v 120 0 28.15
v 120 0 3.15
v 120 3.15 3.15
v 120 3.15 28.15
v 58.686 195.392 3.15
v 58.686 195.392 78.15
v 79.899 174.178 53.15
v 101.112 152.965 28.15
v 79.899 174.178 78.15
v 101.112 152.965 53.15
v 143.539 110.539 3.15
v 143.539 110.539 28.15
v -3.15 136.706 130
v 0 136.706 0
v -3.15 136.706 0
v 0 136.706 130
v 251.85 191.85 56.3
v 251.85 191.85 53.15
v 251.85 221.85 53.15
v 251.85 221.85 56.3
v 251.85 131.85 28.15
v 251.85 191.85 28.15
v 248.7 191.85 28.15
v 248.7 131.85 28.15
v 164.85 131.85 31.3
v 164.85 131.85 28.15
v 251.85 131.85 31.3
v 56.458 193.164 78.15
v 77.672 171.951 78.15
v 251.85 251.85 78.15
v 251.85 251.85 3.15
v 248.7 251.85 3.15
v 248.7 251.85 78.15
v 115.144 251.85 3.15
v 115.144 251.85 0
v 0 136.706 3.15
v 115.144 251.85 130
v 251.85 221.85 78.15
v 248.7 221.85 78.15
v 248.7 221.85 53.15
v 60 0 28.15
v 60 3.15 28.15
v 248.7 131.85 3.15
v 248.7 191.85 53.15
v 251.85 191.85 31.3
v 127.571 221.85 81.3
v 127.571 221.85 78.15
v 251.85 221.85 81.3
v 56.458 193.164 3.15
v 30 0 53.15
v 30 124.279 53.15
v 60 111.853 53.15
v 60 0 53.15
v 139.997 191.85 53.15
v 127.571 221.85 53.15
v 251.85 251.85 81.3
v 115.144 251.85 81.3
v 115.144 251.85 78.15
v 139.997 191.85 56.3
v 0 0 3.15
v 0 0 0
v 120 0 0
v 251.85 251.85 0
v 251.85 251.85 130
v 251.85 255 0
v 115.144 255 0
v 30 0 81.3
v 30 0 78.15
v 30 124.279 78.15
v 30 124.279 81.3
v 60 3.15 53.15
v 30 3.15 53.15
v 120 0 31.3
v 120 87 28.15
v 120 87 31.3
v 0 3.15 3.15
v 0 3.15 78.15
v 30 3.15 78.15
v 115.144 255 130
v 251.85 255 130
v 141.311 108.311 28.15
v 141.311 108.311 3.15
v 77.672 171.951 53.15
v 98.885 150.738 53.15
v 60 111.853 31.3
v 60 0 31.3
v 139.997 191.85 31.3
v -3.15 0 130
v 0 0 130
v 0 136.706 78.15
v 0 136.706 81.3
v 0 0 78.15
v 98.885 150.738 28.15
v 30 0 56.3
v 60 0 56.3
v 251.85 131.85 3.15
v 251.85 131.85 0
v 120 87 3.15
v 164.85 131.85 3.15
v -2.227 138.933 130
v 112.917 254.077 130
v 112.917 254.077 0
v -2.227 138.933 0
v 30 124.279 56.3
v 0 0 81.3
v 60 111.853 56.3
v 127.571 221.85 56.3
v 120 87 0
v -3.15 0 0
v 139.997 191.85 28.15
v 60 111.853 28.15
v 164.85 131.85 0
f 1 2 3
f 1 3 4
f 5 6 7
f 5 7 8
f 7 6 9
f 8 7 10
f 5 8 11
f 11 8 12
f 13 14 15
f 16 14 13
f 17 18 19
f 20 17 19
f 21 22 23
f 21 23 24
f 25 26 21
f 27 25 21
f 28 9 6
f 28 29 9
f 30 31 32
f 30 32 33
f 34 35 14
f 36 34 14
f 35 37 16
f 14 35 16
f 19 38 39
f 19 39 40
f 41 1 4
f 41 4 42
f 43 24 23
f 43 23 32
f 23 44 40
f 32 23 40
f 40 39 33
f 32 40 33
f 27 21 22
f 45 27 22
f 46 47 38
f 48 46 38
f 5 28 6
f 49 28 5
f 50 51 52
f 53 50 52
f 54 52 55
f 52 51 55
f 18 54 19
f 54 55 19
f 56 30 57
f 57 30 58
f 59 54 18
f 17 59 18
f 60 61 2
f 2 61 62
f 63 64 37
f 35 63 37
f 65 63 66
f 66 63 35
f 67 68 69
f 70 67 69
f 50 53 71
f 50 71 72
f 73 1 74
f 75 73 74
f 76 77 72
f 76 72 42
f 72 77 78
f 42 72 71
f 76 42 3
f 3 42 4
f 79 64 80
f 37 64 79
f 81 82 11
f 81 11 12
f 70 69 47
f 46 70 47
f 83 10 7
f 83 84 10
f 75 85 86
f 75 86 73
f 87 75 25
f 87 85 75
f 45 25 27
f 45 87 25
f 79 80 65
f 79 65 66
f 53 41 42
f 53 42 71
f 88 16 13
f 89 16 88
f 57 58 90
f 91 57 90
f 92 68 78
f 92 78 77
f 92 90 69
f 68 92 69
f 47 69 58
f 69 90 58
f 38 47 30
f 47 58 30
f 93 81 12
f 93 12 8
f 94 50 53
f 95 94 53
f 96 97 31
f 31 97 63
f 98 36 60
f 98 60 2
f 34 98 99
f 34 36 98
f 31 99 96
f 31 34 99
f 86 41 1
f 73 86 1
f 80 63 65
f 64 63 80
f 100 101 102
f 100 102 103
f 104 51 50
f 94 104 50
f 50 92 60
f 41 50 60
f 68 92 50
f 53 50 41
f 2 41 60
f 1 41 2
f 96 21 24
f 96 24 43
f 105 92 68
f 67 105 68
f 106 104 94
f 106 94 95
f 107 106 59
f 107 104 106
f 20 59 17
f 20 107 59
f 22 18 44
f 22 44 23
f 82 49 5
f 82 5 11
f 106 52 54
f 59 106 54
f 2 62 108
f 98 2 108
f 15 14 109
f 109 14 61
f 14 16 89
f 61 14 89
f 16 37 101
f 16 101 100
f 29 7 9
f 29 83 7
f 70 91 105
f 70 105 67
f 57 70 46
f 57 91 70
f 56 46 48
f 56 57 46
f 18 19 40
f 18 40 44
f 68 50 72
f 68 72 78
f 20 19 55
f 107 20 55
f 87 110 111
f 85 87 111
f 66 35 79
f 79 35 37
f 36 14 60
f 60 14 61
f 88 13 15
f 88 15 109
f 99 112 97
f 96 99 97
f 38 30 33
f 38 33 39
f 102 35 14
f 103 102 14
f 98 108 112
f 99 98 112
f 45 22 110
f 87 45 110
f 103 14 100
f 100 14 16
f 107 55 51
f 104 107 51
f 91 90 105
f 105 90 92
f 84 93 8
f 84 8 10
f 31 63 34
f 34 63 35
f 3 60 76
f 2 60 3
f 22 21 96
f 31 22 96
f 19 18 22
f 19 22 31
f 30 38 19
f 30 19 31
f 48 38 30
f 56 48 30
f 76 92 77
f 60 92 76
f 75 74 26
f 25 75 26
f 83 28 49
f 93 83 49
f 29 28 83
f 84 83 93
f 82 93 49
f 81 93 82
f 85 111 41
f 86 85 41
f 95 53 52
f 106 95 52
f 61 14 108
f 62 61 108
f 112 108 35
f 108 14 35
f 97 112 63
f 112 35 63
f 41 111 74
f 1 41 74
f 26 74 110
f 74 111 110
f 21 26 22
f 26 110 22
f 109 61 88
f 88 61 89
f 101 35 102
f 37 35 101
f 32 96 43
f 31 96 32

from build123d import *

# Parameters (mm, degrees)
F2_DEPTH       = 3.15
F4_DEPTH       = 3.15
F6_DEPTH       = 3.15
F7_W           = 136.7056274848
F7_H           = 130
F8_DEPTH       = 3.15
F9_W           = 136.7056274848
F9_H           = 130
F10_DEPTH      = 3.15
F11_W          = 162.838733242
F11_H          = 130
F12_DEPTH      = 3.15
F16_DEPTH      = 1.575
F16_DEPTH_BACK = 1.575
F18_DEPTH      = 3.15
F20_DEPTH      = 3.15
F22_DEPTH      = 3.15


with BuildPart() as f2:
    # F1 (on Top) → F2 (new body)
    with BuildSketch(Plane.XY):
        Polygon((0, 136.7056274848), (0, 0), (120, 0), (120, 87), (164.85, 131.85), (251.85, 131.85), (251.85, 251.85), (115.1443725152, 251.85), align=None)
    extrude(amount=F2_DEPTH)


with BuildPart() as f4:
    # F3 (on face) → F4 (new body)
    with BuildSketch(Plane.XZ):
        Polygon((0, 78.15), (0, 3.15), (120, 3.15), (120, 28.15), (60, 28.15), (60, 53.15), (30, 53.15), (30, 78.15), align=None)
    extrude(amount=-F4_DEPTH)


with BuildPart() as f6:
    # F5 (on face) → F6 (new body)
    with BuildSketch(Plane.YZ.offset(251.85)):
        Polygon((251.85, 78.15), (221.85, 78.15), (221.85, 53.15), (191.85, 53.15), (191.85, 28.15), (131.85, 28.15), (131.85, 3.15), (251.85, 3.15), align=None)
    extrude(amount=-F6_DEPTH)


with BuildPart() as f8:
    # F7 (on face) → F8 (new body)
    with BuildSketch(Plane(origin=(0, 0, 0), x_dir=(0, -1, 0), z_dir=(-1, 0, 0))):
        with Locations((-68.3528137424, 65)):
            Rectangle(F7_W, F7_H)
    extrude(amount=F8_DEPTH)


with BuildPart() as f10:
    # F9 (on face) → F10 (new body)
    with BuildSketch(Plane(origin=(0, 251.85, 0), x_dir=(-1, 0, 0), z_dir=(0, 1, 0))):
        with Locations((-183.4971862576, 65)):
            Rectangle(F9_W, F9_H)
    extrude(amount=F10_DEPTH)


with BuildPart() as f12:
    # F11 (on face) → F12 (new body)
    with BuildSketch(Plane(origin=(-68.3528137424, 68.3528137424, 0), x_dir=(-0.7071067812, -0.7071067812, 0), z_dir=(-0.7071067812, 0.7071067812, 0))):
        with Locations((-178.0848428418, 65)):
            Rectangle(F11_W, F11_H)
    extrude(amount=F12_DEPTH)


with BuildPart() as f16:
    # F15 (on plane+point) → F16 (new body, two sides)
    with BuildSketch(Plane(origin=(125.925, 125.925, 0), x_dir=(0.7071067812, -0.7071067812, 0), z_dir=(-0.7071067812, -0.7071067812, 0))) as f16_sk:
        Polygon((-66.6654762208, 78.15), (-96.6654762208, 78.15), (-96.6654762208, 3.15), (23.3345237792, 3.15), (23.3345237792, 28.15), (-36.6654762208, 28.15), (-36.6654762208, 53.15), (-66.6654762208, 53.15), align=None)
    extrude(amount=F16_DEPTH)
    extrude(f16_sk.sketch, amount=-F16_DEPTH_BACK)


with BuildPart() as f18:
    # F17 (on face) → F18 (new body)
    with BuildSketch(Plane.XY.offset(28.15)):
        Polygon((251.85, 191.85), (139.9971862576, 191.85), (60, 111.8528137424), (60, 0), (120, 0), (120, 87), (164.85, 131.85), (251.85, 131.85), align=None)
    extrude(amount=F18_DEPTH)


with BuildPart() as f20:
    # F19 (on face) → F20 (new body)
    with BuildSketch(Plane.XY.offset(53.15)):
        Polygon((251.85, 221.85), (127.5707793864, 221.85), (30, 124.2792206136), (30, 0), (60, 0), (60, 111.8528137424), (139.9971862576, 191.85), (251.85, 191.85), align=None)
    extrude(amount=F20_DEPTH)


with BuildPart() as f22:
    # F21 (on face) → F22 (new body)
    with BuildSketch(Plane.XY.offset(78.15)):
        Polygon((0, 136.7056274848), (0, 0), (30, 0), (30, 124.2792206136), (127.5707793864, 221.85), (251.85, 221.85), (251.85, 251.85), (115.1443725152, 251.85), align=None)
    extrude(amount=F22_DEPTH)


solid = Compound([f2.part, f4.part, f6.part, f8.part, f10.part, f12.part, f16.part, f18.part, f20.part, f22.part])
